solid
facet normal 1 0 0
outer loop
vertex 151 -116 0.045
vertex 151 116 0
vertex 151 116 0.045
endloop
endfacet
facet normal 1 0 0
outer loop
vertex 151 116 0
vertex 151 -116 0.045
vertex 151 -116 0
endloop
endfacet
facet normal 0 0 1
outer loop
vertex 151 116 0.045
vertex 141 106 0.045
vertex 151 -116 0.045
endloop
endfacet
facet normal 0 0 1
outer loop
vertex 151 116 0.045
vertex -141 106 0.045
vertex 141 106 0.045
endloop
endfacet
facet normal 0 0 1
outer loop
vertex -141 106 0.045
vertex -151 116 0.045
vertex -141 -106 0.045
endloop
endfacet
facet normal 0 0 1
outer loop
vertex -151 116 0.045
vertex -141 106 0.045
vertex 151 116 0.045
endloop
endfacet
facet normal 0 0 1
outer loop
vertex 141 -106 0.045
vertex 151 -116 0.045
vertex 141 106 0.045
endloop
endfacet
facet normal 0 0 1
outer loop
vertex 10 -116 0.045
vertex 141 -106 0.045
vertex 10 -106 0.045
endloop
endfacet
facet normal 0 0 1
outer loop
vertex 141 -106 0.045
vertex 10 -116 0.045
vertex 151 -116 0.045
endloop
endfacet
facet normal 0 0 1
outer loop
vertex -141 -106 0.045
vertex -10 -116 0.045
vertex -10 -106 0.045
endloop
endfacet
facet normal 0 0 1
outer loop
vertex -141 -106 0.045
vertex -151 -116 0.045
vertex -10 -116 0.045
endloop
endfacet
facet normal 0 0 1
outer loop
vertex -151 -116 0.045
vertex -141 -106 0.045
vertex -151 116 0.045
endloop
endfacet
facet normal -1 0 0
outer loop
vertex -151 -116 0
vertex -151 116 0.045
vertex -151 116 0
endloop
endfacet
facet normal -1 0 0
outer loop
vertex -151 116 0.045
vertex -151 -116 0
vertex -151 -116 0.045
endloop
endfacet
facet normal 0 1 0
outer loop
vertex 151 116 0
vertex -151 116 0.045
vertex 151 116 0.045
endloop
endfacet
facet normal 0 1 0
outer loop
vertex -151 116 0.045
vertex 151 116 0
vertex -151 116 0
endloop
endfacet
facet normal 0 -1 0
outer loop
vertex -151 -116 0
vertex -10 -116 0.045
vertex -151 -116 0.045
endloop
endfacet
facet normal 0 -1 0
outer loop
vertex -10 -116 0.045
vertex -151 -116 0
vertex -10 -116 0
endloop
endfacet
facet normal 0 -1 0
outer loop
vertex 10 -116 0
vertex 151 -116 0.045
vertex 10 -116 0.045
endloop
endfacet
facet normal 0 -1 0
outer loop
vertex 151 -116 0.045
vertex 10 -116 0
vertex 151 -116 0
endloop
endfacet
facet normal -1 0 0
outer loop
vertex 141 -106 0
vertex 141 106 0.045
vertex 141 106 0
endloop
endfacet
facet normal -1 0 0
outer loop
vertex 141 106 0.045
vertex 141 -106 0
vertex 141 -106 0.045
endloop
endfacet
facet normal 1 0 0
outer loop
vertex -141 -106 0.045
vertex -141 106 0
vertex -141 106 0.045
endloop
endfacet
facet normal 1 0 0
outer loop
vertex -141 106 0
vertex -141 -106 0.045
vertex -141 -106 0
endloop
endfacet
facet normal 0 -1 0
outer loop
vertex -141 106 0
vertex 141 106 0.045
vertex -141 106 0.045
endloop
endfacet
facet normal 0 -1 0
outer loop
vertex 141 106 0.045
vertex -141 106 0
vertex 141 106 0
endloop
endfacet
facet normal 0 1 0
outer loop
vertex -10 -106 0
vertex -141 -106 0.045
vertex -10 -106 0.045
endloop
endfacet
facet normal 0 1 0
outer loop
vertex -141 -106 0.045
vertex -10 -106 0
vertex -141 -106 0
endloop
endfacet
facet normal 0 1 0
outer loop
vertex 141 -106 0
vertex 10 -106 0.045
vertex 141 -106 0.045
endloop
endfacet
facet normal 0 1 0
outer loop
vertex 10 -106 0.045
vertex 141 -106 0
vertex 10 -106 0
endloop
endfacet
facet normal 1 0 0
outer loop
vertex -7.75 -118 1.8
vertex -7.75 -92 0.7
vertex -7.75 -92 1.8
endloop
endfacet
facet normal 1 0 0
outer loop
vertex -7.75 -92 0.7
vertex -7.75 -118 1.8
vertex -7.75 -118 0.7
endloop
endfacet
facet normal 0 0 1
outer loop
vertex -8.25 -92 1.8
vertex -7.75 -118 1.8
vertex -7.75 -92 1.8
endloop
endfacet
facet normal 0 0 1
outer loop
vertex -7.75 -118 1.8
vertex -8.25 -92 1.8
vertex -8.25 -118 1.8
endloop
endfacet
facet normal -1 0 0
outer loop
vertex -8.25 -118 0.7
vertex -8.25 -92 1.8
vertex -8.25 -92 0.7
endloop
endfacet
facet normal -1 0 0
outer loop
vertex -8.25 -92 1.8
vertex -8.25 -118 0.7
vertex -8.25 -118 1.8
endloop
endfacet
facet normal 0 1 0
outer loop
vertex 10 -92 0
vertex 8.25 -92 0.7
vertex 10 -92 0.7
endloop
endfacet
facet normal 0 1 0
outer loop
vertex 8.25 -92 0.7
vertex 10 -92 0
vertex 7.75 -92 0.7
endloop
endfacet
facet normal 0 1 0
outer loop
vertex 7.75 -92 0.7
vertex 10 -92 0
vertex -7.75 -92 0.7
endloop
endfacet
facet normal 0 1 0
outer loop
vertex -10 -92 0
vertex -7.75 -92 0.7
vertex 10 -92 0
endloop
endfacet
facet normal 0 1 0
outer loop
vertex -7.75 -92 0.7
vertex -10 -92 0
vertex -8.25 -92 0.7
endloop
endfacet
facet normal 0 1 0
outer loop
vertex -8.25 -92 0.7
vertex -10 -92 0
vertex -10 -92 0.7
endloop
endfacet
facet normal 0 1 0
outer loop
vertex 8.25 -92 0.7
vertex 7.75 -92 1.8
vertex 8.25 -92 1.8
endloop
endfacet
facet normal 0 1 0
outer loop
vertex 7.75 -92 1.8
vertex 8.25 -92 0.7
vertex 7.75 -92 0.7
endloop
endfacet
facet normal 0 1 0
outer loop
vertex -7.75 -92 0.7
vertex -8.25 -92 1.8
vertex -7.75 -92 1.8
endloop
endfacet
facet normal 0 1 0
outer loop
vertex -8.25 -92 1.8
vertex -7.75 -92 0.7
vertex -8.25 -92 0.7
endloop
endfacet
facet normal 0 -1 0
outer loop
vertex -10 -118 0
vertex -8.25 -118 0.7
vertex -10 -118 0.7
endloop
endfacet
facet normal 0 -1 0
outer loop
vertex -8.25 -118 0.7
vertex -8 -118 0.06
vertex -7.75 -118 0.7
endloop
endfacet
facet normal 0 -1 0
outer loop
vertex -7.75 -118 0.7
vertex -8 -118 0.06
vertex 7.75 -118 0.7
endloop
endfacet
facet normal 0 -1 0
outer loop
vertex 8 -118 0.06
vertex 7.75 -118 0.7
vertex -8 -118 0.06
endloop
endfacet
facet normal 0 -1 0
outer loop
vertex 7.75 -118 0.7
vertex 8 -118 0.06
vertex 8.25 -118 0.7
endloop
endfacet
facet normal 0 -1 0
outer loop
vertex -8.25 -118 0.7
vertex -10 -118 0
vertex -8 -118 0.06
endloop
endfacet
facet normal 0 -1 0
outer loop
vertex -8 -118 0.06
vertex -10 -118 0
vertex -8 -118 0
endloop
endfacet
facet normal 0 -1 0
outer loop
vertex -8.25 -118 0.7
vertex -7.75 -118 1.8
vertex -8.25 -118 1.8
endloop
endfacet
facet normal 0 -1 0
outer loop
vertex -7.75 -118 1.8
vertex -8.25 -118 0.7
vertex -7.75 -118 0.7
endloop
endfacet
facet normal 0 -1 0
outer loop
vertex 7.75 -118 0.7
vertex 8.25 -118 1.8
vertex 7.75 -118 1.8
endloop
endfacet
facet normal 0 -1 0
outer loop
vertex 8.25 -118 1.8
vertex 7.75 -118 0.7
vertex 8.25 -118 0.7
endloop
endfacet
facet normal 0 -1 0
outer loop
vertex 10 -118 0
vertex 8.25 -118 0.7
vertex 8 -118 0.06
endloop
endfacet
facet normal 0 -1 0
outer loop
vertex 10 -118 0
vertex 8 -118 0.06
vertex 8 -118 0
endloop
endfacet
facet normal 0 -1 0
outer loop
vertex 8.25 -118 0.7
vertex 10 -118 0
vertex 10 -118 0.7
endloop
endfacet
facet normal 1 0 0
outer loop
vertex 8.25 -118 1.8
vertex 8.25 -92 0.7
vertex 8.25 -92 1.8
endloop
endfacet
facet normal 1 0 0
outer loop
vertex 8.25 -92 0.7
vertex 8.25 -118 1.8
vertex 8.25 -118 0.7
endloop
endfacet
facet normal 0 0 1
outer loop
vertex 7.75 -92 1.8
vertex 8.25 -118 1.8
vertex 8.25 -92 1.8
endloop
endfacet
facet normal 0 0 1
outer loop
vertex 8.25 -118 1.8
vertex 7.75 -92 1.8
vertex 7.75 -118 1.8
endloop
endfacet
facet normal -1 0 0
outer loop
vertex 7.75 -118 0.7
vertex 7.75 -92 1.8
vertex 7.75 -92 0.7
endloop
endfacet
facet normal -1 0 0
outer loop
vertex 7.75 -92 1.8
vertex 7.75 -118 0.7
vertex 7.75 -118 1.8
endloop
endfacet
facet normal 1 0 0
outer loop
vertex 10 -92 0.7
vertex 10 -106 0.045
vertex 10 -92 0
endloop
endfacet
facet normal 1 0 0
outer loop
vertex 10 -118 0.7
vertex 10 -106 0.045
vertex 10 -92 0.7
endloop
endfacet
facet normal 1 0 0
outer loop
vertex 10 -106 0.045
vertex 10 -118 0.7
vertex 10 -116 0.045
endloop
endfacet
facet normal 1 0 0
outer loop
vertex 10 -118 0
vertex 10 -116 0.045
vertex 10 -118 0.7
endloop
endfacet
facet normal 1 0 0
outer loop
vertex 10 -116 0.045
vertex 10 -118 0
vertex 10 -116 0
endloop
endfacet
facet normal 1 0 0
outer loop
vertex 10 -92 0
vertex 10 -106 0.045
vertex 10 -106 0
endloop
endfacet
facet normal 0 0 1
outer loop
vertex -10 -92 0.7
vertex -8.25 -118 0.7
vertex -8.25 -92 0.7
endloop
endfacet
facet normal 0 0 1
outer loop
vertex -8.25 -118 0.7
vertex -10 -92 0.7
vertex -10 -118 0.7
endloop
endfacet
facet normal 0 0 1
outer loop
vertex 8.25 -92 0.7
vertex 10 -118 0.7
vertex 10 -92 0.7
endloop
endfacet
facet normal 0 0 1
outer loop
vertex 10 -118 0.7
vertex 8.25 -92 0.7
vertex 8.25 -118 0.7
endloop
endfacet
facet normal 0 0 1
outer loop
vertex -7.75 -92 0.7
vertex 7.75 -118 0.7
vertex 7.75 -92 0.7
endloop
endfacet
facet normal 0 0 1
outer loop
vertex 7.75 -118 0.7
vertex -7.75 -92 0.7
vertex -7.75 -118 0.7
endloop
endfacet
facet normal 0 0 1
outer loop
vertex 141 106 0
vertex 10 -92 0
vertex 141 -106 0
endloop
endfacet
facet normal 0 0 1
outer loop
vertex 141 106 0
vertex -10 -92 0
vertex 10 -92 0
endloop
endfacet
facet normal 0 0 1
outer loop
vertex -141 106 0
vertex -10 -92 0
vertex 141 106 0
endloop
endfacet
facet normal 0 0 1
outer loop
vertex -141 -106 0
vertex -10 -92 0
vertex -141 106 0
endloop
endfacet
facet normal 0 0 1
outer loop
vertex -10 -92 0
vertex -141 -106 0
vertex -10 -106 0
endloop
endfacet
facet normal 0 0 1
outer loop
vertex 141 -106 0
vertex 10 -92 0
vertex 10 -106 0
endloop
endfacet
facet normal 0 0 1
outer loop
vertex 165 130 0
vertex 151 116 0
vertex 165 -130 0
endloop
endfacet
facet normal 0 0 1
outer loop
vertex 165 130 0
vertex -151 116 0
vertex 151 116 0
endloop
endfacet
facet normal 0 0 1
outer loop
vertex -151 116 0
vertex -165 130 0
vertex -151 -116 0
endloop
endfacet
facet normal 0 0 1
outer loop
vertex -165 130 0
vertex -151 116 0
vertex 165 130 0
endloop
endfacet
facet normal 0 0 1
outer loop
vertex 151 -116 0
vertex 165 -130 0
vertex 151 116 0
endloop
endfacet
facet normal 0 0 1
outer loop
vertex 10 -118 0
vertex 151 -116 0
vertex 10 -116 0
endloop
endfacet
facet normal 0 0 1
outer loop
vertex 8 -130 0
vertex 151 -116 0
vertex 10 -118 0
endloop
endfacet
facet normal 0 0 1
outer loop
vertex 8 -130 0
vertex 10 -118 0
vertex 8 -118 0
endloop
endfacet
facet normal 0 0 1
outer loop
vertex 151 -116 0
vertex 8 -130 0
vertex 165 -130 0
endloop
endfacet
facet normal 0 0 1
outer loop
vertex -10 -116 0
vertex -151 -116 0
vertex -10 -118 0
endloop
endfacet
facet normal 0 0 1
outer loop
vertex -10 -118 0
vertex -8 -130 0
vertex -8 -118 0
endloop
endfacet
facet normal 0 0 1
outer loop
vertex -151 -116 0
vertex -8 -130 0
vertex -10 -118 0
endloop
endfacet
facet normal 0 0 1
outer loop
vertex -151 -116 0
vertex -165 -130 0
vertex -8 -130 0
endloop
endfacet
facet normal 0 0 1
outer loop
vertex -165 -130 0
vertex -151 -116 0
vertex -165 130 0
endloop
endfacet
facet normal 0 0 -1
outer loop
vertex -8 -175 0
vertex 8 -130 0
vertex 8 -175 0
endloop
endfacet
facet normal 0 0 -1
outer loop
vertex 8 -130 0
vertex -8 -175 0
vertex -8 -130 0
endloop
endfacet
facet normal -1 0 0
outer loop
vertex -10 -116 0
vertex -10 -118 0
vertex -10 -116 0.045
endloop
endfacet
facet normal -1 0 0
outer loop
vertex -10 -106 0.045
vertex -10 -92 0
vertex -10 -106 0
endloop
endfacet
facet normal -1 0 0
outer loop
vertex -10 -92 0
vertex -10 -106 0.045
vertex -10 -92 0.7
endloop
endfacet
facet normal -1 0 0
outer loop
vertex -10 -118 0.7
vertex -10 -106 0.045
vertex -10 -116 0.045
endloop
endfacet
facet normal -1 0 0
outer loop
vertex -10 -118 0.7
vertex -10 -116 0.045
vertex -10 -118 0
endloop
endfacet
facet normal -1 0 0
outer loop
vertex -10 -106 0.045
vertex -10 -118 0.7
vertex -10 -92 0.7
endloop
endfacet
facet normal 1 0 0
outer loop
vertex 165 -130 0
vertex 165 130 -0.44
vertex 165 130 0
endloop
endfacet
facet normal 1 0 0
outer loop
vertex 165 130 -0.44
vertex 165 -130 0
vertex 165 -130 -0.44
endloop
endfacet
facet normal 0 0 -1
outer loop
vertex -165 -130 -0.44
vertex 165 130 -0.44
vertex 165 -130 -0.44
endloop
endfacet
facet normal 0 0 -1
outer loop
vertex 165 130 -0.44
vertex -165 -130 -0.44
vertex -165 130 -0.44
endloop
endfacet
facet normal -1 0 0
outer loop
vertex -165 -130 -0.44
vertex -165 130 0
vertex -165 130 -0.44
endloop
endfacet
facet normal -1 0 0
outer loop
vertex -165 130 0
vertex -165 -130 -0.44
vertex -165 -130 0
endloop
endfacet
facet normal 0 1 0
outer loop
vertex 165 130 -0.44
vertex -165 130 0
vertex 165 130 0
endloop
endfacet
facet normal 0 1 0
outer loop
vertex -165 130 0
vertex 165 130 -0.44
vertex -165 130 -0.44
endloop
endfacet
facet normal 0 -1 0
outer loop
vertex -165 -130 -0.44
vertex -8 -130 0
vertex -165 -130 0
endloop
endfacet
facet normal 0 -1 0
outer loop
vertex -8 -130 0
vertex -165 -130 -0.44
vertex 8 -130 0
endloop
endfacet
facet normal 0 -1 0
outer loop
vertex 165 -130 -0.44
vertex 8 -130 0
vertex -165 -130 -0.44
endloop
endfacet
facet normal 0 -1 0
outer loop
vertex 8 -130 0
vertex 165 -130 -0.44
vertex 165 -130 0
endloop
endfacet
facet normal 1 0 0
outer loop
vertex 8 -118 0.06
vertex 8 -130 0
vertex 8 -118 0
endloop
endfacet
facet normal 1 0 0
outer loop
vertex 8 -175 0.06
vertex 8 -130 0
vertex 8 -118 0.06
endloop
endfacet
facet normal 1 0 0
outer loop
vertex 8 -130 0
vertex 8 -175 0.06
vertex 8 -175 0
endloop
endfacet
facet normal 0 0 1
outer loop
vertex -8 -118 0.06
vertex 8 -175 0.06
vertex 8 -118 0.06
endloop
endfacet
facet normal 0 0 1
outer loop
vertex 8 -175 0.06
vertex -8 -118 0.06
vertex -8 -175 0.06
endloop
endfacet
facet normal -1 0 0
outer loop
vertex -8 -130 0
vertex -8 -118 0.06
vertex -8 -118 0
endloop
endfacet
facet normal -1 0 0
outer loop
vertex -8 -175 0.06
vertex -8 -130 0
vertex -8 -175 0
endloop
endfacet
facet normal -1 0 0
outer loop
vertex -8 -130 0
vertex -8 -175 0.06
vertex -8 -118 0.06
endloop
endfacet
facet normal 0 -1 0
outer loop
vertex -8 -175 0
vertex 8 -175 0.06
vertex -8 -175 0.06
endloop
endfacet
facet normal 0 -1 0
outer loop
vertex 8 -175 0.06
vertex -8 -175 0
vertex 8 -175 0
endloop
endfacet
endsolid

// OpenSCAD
// file: roads.scad
// ============================================================
// Ancient Chinese City - roads
// ============================================================

$fn = 32;

use <common.scad>

module road_x(L,W) {
    color(c_road())
    translate([0,0,0.03])
    boxc([L,W,0.06]);
}

module road_y(L,W) {
    color(c_road())
    translate([0,0,0.03])
    boxc([W,L,0.06]);
}

module inner_roads() {
    road_y(city_h()-30, main_road_w());
    road_x(city_w()-30, main_road_w());

    translate([0, 48, 0]) road_x(city_w()-48, side_road_w());
    translate([0,-44, 0]) road_x(city_w()-48, side_road_w());

    translate([-68,0,0]) road_y(city_h()-50, side_road_w());
    translate([ 68,0,0]) road_y(city_h()-50, side_road_w());

    for (x=[-96,-40,40,96]) {
        translate([x,35,0]) road_y(36,3.2);
        translate([x,-32,0]) road_y(32,3.2);
    }

    color([0.66,0.59,0.47])
    translate([0,0,0.06])
    boxc([32,26,0.1]);
}

// Standalone preview.
inner_roads();
// file: common.scad
// ============================================================
// Ancient Chinese City - shared parameters and primitive helpers
// ============================================================

function city_w() = 260;
function city_h() = 190;

function wall_t() = 14;
function wall_h() = 15;
function parapet_h() = 2.4;

function gate_w() = 28;

function main_road_w() = 9;
function side_road_w() = 5;

function c_ground()     = [0.60, 0.73, 0.48];
function c_road()       = [0.60, 0.54, 0.42];
function c_stone()      = [0.53, 0.50, 0.45];
function c_stone_dark() = [0.36, 0.34, 0.31];
function c_stone_lite() = [0.70, 0.66, 0.58];
function c_walkway()    = [0.64, 0.61, 0.54];

function c_wood()       = [0.42, 0.22, 0.10];
function c_wood_dark()  = [0.22, 0.11, 0.05];
function c_plaster()    = [0.84, 0.79, 0.67];

function c_roof()       = [0.55, 0.10, 0.06];
function c_roof_dark()  = [0.26, 0.06, 0.035];

function c_lantern()    = [0.86, 0.16, 0.08];
function c_flag()       = [0.72, 0.08, 0.06];
function c_green()      = [0.18, 0.42, 0.14];
function c_water()      = [0.28, 0.46, 0.60];

module boxc(s) {
    cube(s, center=true);
}

module stepped_base(L=20, D=16, H1=0.8, H2=0.5) {
    color(c_stone_dark())
    translate([0,0,H1/2])
    boxc([L,D,H1]);

    color(c_stone_lite())
    translate([0,0,H1+H2/2])
    boxc([L-1.4,D-1.4,H2]);
}

// Standalone preview.
stepped_base();
// main file
// ============================================================
// Ancient Chinese City - terrain, moat and bridge
// ============================================================

$fn = 32;

use <common.scad>
use <roads.scad>

module moat() {
    color(c_water())
    difference() {
        translate([0,0,0.015])
        boxc([city_w()+42, city_h()+42, 0.06]);

        translate([0,0,0.015])
        boxc([city_w()+22, city_h()+22, 0.08]);
    }
}

module bridge_to_gate() {
    color(c_stone_lite())
    translate([0,-city_h()/2-10,0.35])
    boxc([20,26,0.7]);

    for (x=[-8,8]) {
        color(c_stone_dark())
        translate([x,-city_h()/2-10,1.1])
        boxc([0.5,26,1.4]);
    }
}

module city_ground() {
    color(c_ground())
    translate([0,0,-0.22])
    boxc([city_w()+70, city_h()+70, 0.44]);

    moat();
    bridge_to_gate();

    translate([0,-city_h()/2-45,0])
    road_y(70,16);
}

// Standalone preview.
city_ground();
